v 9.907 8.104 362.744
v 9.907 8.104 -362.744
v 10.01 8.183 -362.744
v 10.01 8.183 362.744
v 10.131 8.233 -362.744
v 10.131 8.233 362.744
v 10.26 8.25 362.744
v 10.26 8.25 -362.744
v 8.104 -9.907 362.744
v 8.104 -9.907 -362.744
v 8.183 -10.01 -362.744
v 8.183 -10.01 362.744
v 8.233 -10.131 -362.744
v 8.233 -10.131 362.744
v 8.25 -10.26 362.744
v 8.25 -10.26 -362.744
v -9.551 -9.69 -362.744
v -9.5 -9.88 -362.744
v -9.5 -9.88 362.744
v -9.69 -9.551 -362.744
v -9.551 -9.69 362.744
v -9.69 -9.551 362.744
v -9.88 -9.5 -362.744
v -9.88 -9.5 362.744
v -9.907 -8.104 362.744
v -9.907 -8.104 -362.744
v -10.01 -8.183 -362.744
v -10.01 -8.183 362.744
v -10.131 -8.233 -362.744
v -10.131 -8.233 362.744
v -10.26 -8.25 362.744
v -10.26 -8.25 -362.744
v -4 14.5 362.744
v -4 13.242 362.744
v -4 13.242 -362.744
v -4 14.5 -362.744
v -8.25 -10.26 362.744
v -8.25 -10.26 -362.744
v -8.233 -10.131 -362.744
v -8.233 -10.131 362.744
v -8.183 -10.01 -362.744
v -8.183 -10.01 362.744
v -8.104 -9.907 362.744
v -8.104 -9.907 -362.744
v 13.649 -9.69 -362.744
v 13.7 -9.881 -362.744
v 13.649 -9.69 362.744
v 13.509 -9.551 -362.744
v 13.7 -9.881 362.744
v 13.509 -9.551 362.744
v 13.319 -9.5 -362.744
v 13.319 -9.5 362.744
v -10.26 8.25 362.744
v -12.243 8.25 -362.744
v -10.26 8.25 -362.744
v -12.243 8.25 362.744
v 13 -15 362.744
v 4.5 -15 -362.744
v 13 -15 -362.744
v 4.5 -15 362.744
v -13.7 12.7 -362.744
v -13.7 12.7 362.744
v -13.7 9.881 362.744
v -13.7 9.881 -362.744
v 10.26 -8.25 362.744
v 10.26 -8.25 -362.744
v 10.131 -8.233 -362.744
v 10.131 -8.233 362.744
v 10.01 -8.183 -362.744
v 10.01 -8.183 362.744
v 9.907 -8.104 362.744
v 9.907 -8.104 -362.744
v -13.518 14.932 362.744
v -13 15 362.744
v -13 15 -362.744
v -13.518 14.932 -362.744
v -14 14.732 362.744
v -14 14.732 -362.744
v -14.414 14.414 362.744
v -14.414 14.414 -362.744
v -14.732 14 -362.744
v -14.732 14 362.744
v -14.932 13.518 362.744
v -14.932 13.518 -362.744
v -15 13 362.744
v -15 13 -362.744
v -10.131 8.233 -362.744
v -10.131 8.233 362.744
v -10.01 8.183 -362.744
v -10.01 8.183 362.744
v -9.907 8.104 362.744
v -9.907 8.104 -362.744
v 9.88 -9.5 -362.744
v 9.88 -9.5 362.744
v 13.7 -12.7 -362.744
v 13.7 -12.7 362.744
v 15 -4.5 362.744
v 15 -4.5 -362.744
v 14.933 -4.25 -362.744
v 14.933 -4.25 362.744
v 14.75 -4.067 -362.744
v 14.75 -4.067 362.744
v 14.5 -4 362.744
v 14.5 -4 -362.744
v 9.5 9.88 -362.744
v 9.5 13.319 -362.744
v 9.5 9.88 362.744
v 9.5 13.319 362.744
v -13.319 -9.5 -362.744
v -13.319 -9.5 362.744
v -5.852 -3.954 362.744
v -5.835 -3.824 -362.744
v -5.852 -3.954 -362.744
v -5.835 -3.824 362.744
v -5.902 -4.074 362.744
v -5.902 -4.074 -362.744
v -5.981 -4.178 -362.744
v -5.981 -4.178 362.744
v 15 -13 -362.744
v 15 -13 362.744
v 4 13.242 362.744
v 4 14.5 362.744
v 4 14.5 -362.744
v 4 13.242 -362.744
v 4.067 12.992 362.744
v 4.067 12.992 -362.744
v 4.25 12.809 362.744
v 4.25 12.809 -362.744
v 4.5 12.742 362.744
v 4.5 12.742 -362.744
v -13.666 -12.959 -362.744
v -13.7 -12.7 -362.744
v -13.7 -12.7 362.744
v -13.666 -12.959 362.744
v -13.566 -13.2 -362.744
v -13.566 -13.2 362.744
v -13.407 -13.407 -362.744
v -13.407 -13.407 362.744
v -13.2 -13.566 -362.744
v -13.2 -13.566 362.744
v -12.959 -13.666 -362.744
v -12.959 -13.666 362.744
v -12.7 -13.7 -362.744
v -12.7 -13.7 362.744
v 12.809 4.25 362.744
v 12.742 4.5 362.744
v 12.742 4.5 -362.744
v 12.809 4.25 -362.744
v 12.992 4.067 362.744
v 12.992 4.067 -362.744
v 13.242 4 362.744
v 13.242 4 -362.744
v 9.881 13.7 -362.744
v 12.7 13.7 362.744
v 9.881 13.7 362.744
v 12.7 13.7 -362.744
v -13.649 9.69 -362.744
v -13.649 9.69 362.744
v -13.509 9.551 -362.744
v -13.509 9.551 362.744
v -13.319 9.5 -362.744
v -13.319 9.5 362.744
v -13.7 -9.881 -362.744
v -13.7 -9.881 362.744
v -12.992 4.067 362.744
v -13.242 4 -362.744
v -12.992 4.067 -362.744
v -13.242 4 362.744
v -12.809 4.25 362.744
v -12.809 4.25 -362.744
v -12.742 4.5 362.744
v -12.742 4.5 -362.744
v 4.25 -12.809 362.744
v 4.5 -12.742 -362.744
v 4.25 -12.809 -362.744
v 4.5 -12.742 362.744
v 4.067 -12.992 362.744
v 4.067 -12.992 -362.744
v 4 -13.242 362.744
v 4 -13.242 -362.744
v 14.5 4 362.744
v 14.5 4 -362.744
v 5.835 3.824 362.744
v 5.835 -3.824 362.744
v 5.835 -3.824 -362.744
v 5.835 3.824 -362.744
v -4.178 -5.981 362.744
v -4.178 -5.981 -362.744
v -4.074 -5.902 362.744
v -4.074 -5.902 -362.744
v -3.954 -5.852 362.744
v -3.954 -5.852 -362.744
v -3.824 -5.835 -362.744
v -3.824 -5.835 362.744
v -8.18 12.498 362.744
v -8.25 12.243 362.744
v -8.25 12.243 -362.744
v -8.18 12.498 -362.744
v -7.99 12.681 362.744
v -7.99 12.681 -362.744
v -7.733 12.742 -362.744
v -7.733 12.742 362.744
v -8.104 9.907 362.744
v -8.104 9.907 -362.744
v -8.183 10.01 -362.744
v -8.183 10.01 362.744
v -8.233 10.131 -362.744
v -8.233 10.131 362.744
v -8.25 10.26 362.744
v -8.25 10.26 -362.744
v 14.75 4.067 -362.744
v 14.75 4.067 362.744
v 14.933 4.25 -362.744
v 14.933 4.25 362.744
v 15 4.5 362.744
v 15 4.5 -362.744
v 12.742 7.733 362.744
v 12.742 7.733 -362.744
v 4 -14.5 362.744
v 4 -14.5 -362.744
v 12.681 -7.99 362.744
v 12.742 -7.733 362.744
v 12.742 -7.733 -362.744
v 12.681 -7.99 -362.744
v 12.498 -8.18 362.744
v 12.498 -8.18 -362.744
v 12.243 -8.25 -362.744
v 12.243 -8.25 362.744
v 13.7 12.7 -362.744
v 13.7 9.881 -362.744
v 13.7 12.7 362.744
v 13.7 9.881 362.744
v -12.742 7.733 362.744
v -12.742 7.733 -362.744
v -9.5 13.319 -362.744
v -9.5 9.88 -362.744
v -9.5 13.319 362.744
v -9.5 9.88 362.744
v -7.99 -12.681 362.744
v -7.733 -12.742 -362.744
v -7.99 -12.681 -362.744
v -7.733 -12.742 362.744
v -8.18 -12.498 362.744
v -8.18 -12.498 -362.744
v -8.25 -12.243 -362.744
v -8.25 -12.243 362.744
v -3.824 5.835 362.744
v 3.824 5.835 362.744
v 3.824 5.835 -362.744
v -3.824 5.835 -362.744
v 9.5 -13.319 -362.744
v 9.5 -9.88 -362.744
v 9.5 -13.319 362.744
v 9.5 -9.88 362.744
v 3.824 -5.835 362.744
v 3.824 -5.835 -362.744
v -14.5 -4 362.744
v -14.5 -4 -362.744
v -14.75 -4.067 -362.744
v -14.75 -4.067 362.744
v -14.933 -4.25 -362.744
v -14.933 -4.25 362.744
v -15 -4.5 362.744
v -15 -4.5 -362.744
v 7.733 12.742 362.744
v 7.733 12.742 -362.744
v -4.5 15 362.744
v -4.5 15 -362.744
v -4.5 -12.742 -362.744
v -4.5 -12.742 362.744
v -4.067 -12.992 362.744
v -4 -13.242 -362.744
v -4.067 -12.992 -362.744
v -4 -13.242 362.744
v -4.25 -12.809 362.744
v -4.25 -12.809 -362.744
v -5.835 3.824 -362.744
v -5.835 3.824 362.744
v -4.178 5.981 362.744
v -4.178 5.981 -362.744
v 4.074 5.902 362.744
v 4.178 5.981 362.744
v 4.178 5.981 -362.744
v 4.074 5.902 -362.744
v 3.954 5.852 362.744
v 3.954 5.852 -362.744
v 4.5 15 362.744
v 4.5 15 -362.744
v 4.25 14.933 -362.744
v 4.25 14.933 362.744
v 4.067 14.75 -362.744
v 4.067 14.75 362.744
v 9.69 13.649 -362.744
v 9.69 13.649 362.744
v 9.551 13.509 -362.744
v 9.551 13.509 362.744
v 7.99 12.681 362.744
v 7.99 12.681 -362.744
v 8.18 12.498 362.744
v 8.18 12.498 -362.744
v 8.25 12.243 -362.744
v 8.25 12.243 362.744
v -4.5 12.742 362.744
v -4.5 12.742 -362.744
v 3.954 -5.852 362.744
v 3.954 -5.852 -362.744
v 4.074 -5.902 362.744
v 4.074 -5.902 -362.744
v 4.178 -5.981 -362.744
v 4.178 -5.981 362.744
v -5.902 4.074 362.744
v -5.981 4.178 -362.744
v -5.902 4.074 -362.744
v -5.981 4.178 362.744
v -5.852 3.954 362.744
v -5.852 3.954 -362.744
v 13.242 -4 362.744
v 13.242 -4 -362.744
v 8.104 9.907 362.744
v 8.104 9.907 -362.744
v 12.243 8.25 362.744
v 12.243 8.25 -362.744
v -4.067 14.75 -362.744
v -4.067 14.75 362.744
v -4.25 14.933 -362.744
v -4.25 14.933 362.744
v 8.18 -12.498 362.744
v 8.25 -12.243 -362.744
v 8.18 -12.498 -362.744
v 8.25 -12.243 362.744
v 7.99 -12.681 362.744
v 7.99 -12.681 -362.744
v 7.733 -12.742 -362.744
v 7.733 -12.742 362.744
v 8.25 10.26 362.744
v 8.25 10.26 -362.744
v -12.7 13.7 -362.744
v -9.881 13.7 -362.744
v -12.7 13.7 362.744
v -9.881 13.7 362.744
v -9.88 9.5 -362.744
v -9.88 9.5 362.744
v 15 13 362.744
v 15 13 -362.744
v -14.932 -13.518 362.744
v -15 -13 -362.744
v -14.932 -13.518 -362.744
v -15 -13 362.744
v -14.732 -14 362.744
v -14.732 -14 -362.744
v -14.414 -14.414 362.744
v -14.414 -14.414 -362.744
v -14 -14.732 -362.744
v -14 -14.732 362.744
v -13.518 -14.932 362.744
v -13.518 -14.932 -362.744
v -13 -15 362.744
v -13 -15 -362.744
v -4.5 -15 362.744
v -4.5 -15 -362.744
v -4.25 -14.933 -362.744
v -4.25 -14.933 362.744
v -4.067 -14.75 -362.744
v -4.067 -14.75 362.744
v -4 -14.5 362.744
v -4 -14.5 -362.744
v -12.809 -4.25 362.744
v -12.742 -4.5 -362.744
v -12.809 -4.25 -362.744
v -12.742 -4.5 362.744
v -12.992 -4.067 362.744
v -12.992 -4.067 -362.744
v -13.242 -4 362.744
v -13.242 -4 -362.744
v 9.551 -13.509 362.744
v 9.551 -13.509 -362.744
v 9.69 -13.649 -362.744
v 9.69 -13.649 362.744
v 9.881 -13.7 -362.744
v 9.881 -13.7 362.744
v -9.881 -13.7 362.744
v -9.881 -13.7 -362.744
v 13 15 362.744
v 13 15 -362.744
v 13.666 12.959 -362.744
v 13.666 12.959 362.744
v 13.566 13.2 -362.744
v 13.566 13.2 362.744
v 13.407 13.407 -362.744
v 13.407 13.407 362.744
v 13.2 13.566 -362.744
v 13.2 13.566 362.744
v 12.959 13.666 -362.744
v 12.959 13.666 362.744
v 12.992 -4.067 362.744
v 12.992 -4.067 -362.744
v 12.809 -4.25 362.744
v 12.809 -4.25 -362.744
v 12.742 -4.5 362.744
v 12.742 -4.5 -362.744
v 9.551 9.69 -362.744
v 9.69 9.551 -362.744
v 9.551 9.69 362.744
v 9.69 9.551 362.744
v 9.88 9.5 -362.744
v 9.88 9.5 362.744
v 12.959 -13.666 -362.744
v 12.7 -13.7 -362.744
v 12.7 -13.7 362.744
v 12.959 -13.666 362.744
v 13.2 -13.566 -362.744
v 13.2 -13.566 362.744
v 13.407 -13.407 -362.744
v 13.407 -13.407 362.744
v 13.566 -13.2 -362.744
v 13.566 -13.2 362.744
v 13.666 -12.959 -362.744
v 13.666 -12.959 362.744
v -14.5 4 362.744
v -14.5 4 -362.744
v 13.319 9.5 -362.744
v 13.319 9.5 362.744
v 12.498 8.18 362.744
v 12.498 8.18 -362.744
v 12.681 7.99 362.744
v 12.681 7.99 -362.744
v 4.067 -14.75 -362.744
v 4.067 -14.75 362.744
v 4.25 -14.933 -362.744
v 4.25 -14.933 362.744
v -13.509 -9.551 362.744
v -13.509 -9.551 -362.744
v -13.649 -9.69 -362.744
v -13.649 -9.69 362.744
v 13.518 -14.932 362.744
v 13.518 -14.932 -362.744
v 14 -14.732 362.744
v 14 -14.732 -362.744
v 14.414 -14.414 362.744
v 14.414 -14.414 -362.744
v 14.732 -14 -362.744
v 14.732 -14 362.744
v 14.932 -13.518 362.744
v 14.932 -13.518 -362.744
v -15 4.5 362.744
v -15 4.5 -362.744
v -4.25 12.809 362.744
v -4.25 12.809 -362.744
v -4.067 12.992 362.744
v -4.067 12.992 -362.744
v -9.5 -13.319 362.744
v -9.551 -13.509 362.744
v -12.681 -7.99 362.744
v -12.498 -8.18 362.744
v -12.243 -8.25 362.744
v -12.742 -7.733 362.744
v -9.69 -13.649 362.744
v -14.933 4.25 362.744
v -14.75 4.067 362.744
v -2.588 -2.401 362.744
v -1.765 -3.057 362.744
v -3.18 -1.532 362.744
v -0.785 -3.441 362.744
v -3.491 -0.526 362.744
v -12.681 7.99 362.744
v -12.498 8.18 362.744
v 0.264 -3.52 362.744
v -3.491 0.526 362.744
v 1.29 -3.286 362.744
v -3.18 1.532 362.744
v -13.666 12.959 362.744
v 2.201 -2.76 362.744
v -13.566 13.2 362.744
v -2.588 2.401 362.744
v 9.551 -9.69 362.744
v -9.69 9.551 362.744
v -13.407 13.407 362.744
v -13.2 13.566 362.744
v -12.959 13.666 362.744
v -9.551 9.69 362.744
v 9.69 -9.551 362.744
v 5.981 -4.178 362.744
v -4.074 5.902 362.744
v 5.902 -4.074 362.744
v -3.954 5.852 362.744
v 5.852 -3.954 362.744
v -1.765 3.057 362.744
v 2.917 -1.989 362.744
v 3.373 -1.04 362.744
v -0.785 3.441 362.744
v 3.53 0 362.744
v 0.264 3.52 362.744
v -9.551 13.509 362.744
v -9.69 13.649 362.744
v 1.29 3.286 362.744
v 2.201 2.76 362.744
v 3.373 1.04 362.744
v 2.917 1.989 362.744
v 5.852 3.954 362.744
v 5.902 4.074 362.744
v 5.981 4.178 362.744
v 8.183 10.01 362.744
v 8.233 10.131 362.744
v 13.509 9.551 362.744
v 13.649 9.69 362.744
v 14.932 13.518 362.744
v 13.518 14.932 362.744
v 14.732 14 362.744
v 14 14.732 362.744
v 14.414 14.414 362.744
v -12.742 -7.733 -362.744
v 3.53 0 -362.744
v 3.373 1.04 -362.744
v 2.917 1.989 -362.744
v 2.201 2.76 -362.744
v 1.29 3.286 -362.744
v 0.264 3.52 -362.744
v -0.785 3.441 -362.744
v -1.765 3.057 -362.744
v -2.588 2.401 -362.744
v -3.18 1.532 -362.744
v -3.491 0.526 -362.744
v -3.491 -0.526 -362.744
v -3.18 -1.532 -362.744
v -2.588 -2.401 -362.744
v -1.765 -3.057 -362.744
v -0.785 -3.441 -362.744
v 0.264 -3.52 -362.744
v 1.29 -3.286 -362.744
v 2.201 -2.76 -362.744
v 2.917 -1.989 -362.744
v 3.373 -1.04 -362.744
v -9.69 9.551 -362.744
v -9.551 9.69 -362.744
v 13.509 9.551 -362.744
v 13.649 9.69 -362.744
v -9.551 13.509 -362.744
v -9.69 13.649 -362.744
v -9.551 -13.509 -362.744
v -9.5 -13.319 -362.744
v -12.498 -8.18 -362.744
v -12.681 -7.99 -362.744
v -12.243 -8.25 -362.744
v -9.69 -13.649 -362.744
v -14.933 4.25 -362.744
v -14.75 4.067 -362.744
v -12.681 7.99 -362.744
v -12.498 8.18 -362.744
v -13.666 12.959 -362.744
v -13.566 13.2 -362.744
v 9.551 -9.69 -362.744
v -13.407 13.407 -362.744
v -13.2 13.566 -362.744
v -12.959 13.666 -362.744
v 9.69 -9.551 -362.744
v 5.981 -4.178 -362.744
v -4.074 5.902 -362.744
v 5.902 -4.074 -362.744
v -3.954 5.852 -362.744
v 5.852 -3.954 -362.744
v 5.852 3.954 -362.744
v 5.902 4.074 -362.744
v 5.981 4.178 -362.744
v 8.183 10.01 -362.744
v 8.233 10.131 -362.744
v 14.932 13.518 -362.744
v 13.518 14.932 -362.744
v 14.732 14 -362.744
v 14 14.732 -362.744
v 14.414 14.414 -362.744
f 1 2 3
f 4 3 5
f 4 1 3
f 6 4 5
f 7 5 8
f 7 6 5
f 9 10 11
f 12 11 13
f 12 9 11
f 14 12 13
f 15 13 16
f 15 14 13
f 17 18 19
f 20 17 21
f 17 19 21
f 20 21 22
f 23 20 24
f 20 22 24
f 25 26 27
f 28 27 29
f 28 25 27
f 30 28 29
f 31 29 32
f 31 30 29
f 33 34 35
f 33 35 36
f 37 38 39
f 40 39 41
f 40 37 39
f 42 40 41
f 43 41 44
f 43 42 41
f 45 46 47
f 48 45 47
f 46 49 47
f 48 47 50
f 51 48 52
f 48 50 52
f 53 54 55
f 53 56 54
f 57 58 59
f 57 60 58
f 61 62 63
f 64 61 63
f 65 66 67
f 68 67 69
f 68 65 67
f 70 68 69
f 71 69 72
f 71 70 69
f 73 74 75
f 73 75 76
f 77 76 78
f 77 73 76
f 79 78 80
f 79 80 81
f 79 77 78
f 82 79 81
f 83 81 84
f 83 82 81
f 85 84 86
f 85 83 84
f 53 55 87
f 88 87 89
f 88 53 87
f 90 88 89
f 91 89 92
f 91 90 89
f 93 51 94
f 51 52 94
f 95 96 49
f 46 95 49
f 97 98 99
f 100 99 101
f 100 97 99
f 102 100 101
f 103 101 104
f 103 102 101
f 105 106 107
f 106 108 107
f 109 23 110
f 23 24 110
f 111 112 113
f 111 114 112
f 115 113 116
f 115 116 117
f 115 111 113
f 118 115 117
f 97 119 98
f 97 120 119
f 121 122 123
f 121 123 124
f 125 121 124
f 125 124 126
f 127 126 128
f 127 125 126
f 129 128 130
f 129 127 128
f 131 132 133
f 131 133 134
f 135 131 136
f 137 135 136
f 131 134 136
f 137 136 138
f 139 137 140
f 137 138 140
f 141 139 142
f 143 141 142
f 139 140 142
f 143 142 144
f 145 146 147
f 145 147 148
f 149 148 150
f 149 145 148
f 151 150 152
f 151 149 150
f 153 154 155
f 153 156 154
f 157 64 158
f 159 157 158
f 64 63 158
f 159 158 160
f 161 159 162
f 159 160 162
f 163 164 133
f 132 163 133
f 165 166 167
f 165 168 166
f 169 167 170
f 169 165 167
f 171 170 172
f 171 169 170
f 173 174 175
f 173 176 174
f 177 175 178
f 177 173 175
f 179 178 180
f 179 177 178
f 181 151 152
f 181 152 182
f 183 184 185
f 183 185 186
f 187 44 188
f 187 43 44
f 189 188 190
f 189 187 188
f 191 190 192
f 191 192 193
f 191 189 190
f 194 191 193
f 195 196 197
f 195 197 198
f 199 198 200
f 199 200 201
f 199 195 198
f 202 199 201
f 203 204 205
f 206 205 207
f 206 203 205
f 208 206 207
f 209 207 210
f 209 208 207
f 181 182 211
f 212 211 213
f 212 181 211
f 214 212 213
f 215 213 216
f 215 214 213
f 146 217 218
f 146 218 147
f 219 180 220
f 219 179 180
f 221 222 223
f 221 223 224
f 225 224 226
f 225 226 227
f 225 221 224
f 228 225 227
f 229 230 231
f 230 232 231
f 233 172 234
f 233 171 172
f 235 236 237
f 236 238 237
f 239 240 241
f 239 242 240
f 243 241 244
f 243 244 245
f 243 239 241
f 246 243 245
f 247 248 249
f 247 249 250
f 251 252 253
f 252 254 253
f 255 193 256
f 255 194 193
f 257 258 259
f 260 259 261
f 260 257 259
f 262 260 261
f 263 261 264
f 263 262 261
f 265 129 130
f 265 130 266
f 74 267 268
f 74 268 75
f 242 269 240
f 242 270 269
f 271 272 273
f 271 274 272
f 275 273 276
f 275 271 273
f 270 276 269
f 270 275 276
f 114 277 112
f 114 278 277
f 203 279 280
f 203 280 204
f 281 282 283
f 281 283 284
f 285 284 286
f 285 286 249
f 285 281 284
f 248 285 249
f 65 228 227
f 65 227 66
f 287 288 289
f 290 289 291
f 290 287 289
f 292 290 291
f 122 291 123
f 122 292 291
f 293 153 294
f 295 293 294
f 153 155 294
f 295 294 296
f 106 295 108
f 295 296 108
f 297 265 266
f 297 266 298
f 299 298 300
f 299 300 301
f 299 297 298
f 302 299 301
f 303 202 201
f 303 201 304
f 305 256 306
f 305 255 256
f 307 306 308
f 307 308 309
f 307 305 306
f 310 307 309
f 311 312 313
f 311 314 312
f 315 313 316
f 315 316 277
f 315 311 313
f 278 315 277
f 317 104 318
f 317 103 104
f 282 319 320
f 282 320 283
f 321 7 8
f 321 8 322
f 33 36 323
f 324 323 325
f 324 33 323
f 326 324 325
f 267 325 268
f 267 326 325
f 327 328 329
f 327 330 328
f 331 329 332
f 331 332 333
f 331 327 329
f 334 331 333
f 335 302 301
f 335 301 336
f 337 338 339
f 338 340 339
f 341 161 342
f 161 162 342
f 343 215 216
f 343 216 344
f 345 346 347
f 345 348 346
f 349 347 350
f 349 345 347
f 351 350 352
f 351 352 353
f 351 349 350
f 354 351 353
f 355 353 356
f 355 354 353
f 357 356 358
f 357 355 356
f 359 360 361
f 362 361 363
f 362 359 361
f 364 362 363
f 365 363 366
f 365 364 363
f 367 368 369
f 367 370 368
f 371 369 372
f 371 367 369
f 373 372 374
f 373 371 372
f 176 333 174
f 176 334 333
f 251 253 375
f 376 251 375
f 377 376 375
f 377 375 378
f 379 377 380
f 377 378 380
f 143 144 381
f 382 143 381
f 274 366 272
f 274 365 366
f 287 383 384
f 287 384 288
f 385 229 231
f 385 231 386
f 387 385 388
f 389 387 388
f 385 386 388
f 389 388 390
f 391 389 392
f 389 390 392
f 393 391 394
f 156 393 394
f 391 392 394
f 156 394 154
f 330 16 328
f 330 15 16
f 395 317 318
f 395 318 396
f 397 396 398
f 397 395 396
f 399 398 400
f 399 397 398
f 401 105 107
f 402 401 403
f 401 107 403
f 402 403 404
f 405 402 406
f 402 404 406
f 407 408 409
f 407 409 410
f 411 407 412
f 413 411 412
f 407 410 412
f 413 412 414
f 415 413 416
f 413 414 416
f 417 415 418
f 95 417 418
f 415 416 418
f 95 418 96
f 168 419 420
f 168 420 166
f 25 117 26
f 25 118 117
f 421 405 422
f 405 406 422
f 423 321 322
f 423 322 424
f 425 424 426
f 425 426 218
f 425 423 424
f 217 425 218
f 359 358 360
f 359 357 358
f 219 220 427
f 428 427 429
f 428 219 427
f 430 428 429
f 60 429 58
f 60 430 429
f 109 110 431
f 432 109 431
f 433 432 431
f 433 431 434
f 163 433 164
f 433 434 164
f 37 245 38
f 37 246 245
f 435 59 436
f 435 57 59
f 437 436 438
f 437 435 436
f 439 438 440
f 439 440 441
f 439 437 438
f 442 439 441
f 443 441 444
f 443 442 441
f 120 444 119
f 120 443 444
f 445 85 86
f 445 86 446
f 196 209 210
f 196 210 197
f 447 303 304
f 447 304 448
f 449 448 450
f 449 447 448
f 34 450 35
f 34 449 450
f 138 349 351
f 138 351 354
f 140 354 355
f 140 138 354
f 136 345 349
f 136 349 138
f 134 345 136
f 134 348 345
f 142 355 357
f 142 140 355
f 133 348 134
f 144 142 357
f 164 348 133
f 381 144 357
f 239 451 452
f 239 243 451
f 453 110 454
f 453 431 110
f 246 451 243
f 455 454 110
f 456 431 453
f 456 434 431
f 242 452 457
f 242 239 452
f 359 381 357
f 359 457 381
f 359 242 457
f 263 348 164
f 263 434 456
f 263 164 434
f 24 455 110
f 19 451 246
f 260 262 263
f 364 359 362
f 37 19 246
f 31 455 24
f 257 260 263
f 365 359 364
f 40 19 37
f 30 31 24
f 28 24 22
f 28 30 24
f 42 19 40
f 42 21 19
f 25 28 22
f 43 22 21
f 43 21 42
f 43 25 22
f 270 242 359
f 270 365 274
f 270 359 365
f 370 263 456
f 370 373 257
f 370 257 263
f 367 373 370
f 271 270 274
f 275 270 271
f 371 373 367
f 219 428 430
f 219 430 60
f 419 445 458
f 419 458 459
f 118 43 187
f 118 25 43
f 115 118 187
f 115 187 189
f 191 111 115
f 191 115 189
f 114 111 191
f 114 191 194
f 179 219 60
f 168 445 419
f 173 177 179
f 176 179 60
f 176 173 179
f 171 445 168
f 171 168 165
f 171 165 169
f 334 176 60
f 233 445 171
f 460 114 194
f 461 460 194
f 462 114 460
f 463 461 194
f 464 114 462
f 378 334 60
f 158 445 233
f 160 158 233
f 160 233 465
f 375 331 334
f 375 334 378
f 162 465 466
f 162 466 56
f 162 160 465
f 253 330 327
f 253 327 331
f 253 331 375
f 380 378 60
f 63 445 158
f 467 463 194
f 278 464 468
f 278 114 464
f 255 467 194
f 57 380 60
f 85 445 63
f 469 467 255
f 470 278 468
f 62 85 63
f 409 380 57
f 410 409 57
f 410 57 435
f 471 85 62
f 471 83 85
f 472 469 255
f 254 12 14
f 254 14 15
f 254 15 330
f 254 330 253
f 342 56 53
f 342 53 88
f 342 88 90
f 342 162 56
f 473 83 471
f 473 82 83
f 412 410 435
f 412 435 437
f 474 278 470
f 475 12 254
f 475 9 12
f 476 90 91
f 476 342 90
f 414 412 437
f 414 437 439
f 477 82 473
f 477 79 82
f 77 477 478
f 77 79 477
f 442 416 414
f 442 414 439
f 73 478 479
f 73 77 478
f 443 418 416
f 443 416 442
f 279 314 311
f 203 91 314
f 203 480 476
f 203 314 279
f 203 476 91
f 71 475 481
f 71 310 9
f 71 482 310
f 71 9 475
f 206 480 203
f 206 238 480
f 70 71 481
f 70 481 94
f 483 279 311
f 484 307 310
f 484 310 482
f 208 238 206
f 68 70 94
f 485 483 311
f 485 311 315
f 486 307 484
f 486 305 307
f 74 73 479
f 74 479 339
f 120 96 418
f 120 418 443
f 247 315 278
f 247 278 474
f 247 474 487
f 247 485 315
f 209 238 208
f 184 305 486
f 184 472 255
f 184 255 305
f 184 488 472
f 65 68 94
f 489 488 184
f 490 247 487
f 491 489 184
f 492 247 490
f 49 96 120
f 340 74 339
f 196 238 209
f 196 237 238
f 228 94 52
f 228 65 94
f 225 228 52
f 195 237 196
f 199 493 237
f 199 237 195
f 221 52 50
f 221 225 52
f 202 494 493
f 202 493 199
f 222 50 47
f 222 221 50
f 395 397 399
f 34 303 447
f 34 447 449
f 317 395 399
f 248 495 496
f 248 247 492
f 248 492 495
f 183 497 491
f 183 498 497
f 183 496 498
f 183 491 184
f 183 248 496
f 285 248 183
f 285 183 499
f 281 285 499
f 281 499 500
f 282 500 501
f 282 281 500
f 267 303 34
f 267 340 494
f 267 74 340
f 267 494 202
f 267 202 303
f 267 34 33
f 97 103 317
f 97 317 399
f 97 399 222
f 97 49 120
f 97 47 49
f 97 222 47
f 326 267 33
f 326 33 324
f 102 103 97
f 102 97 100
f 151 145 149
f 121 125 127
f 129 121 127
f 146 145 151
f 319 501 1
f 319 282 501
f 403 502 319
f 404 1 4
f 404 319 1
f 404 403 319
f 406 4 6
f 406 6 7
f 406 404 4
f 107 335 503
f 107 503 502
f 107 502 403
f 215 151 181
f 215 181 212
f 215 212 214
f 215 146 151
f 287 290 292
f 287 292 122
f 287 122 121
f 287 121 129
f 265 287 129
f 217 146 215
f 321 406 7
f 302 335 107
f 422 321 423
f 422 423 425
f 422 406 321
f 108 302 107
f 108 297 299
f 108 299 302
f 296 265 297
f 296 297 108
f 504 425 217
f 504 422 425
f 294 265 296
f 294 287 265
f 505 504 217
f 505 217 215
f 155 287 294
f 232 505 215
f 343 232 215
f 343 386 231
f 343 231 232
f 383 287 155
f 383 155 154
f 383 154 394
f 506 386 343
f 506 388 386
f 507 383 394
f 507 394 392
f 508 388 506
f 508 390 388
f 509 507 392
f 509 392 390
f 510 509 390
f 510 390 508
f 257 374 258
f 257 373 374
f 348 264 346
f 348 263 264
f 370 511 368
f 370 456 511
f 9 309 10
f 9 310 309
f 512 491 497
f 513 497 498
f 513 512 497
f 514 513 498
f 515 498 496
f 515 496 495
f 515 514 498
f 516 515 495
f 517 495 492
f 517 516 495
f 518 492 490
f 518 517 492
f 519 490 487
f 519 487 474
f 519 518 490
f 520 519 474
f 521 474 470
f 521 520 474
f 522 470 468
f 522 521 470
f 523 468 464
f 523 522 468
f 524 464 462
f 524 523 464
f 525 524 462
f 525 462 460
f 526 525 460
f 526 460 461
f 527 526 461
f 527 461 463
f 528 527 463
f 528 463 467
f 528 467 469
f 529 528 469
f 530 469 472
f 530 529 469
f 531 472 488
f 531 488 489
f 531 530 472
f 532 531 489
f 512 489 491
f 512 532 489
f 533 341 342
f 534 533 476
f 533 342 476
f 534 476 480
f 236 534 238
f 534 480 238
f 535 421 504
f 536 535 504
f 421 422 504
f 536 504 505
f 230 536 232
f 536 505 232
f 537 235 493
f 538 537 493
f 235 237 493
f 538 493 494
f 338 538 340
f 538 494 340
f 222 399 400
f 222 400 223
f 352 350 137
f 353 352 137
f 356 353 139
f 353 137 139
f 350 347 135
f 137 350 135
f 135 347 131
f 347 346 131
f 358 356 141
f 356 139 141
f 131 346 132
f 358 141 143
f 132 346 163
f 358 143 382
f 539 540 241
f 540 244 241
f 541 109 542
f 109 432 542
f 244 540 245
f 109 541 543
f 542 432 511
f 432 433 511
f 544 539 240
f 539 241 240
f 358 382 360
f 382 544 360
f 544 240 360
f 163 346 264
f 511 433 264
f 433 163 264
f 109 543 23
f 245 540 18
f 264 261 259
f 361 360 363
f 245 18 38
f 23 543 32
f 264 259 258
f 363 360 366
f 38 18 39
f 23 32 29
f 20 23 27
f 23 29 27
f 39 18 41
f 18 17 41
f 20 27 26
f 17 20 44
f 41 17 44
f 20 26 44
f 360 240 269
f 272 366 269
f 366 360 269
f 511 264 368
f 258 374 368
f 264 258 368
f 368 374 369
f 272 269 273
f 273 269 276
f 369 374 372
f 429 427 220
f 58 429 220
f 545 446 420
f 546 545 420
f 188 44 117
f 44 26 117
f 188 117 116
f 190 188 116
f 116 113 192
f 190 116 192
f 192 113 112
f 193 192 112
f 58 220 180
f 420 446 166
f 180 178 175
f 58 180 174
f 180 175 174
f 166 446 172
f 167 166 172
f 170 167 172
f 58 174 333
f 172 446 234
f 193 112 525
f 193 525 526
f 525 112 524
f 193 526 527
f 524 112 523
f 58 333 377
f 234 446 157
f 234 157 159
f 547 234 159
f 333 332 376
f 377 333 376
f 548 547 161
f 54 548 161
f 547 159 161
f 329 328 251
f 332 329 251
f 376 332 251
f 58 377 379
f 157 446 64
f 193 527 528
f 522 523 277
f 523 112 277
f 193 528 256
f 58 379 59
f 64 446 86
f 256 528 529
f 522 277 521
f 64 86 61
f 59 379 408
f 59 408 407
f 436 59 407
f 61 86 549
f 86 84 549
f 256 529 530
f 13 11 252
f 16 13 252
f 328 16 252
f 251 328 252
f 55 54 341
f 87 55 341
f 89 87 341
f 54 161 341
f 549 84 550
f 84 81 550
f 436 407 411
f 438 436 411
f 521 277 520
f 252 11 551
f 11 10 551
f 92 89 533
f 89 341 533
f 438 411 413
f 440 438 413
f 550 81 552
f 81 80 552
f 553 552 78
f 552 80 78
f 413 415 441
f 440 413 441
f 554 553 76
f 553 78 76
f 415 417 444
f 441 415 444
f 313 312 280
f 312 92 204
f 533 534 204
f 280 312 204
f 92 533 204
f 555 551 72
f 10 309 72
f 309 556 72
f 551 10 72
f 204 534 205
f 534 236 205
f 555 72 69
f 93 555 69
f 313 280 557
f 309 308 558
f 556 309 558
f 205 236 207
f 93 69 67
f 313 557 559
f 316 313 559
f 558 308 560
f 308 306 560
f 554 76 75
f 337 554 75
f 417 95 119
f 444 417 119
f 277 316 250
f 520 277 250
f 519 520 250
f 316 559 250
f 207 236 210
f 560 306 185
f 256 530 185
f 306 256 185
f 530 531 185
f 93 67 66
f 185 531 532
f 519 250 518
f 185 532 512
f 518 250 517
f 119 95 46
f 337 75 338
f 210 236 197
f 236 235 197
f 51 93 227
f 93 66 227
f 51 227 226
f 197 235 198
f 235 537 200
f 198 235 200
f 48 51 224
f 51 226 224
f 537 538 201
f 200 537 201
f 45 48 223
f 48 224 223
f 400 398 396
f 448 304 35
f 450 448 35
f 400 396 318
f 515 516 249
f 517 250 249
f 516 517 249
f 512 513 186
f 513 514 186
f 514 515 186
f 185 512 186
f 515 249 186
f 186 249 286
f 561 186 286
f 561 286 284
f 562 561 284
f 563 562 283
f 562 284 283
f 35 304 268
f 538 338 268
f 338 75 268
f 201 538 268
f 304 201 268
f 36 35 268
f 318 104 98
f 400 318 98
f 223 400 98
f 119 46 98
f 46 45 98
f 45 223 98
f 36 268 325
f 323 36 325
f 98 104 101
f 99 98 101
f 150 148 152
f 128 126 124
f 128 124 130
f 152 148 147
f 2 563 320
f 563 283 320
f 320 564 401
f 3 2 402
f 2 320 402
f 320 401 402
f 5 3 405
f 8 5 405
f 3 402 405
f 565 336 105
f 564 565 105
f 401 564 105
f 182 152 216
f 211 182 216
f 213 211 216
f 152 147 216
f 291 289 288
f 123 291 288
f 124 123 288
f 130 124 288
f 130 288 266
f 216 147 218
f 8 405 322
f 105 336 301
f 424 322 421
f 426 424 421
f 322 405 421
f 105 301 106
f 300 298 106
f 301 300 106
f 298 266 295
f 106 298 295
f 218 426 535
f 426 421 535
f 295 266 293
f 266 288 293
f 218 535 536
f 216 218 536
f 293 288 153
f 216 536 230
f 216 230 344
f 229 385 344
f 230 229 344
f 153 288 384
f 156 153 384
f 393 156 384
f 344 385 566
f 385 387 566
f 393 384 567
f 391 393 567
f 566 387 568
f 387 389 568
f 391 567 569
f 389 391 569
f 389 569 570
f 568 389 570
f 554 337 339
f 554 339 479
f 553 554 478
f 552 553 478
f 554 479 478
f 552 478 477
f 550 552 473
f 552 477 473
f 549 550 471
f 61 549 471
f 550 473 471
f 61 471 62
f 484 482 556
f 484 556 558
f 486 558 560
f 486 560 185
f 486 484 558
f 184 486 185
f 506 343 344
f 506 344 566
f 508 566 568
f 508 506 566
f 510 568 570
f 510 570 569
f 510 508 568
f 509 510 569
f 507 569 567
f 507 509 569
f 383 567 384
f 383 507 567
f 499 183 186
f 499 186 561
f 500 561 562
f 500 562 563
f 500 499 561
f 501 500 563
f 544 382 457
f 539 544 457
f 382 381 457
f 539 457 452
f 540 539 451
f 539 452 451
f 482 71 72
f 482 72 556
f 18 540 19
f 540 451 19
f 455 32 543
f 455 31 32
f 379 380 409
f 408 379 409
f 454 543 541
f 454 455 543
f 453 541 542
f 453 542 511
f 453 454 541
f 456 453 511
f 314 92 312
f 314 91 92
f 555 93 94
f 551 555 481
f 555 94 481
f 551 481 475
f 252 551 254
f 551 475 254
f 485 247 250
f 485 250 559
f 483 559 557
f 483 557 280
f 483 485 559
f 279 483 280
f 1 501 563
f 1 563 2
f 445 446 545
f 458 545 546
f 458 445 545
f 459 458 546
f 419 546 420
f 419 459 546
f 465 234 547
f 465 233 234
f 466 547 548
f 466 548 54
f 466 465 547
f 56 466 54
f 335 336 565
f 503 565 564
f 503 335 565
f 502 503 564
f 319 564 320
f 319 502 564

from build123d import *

# Parameters (mm, degrees)
SKETCH1_R           = 3.52998588
BOSS_EXTRUDE1_DEPTH = 362.74375


with BuildPart() as part:
    # Sketch1 → Boss-Extrude1 (new, symmetric)
    with BuildSketch(Plane.XY):
        with BuildLine():
            Line((14.49994, -4), (13.24247465, -4))
            ThreePointArc((13.24247465, -4), (12.88892126, -4.146446609), (12.74247465, -4.5))
            Line((12.74247465, -4.5), (12.74247465, -7.732519321))
            ThreePointArc((12.74247465, -7.732519321), (12.602449697, -8.097296796), (12.242781236, -8.249967))
            Line((12.242781236, -8.249967), (10.260188032, -8.249967))
            ThreePointArc((10.260188032, -8.249967), (10.068847082, -8.211906919), (9.906636056, -8.103520976))
            Line((9.906636056, -8.103520976), (5.981117769, -4.178002689))
            ThreePointArc((5.981117769, -4.178002689), (5.872731827, -4.015791664), (5.834671745, -3.824450713))
            Line((5.834671745, -3.824450713), (5.834671745, -1.01249595))
            Line((5.834671745, -1.01249595), (5.834671745, 0.88749645))
            Line((5.834671745, 0.88749645), (5.834671745, 3.824450713))
            ThreePointArc((5.834671745, 3.824450713), (5.872731827, 4.015791664), (5.981117769, 4.178002689))
            Line((5.981117769, 4.178002689), (9.906636056, 8.103520976))
            ThreePointArc((9.906636056, 8.103520976), (10.068847082, 8.211906919), (10.260188032, 8.249967))
            Line((10.260188032, 8.249967), (12.242781236, 8.249967))
            ThreePointArc((12.242781236, 8.249967), (12.602449697, 8.097296796), (12.74247465, 7.732519321))
            Line((12.74247465, 7.732519321), (12.74247465, 4.5))
            ThreePointArc((12.74247465, 4.5), (12.88892126, 4.146446609), (13.24247465, 4))
            Line((13.24247465, 4), (14.49994, 4))
            ThreePointArc((14.49994, 4), (14.853493391, 4.146446609), (14.99994, 4.5))
            Line((14.99994, 4.5), (14.99994, 12.999948))
            ThreePointArc((14.99994, 12.999948), (14.414155906, 14.414155906), (12.999948, 14.99994))
            Line((12.999948, 14.99994), (4.5, 14.99994))
            ThreePointArc((4.5, 14.99994), (4.146446609, 14.853493391), (4, 14.49994))
            Line((4, 14.49994), (4, 13.24247465))
            ThreePointArc((4, 13.24247465), (4.146446609, 12.88892126), (4.5, 12.74247465))
            Line((4.5, 12.74247465), (7.732519321, 12.74247465))
            ThreePointArc((7.732519321, 12.74247465), (8.097296796, 12.602449697), (8.249967, 12.242781236))
            Line((8.249967, 12.242781236), (8.249967, 10.260188032))
            ThreePointArc((8.249967, 10.260188032), (8.211906919, 10.068847082), (8.103520976, 9.906636056))
            Line((8.103520976, 9.906636056), (4.178002689, 5.981117769))
            ThreePointArc((4.178002689, 5.981117769), (4.015791664, 5.872731827), (3.824450713, 5.834671745))
            Line((3.824450713, 5.834671745), (0.9499962, 5.834671745))
            Line((0.9499962, 5.834671745), (-0.9499962, 5.834671745))
            Line((-0.9499962, 5.834671745), (-3.824450713, 5.834671745))
            ThreePointArc((-3.824450713, 5.834671745), (-4.015791664, 5.872731827), (-4.178002689, 5.981117769))
            Line((-4.178002689, 5.981117769), (-8.103520976, 9.906636056))
            ThreePointArc((-8.103520976, 9.906636056), (-8.211906919, 10.068847082), (-8.249967, 10.260188032))
            Line((-8.249967, 10.260188032), (-8.249967, 12.242781236))
            ThreePointArc((-8.249967, 12.242781236), (-8.097296796, 12.602449697), (-7.732519321, 12.74247465))
            Line((-7.732519321, 12.74247465), (-4.5, 12.74247465))
            ThreePointArc((-4.5, 12.74247465), (-4.146446609, 12.88892126), (-4, 13.24247465))
            Line((-4, 13.24247465), (-4, 14.49994))
            ThreePointArc((-4, 14.49994), (-4.146446609, 14.853493391), (-4.5, 14.99994))
            Line((-4.5, 14.99994), (-12.999948, 14.99994))
            ThreePointArc((-12.999948, 14.99994), (-14.414155906, 14.414155906), (-14.99994, 12.999948))
            Line((-14.99994, 12.999948), (-14.99994, 4.5))
            ThreePointArc((-14.99994, 4.5), (-14.853493391, 4.146446609), (-14.49994, 4))
            Line((-14.49994, 4), (-13.24247465, 4))
            ThreePointArc((-13.24247465, 4), (-12.88892126, 4.146446609), (-12.74247465, 4.5))
            Line((-12.74247465, 4.5), (-12.74247465, 7.732519321))
            ThreePointArc((-12.74247465, 7.732519321), (-12.602449697, 8.097296796), (-12.242781236, 8.249967))
            Line((-12.242781236, 8.249967), (-10.260188032, 8.249967))
            ThreePointArc((-10.260188032, 8.249967), (-10.068847082, 8.211906919), (-9.906636056, 8.103520976))
            Line((-9.906636056, 8.103520976), (-5.981117769, 4.178002689))
            ThreePointArc((-5.981117769, 4.178002689), (-5.872731827, 4.015791664), (-5.834671745, 3.824450713))
            Line((-5.834671745, 3.824450713), (-5.834671745, 0.88749645))
            Line((-5.834671745, 0.88749645), (-5.834671745, -1.01249595))
            Line((-5.834671745, -1.01249595), (-5.834671745, -3.824450713))
            ThreePointArc((-5.834671745, -3.824450713), (-5.872731827, -4.015791664), (-5.981117769, -4.178002689))
            Line((-5.981117769, -4.178002689), (-9.906636056, -8.103520976))
            ThreePointArc((-9.906636056, -8.103520976), (-10.068847082, -8.211906919), (-10.260188032, -8.249967))
            Line((-10.260188032, -8.249967), (-12.242781236, -8.249967))
            ThreePointArc((-12.242781236, -8.249967), (-12.602449697, -8.097296796), (-12.74247465, -7.732519321))
            Line((-12.74247465, -7.732519321), (-12.74247465, -4.5))
            ThreePointArc((-12.74247465, -4.5), (-12.88892126, -4.146446609), (-13.24247465, -4))
            Line((-13.24247465, -4), (-14.49994, -4))
            ThreePointArc((-14.49994, -4), (-14.853493391, -4.146446609), (-14.99994, -4.5))
            Line((-14.99994, -4.5), (-14.99994, -12.999948))
            ThreePointArc((-14.99994, -12.999948), (-14.414155906, -14.414155906), (-12.999948, -14.99994))
            Line((-12.999948, -14.99994), (-4.5, -14.99994))
            ThreePointArc((-4.5, -14.99994), (-4.146446609, -14.853493391), (-4, -14.49994))
            Line((-4, -14.49994), (-4, -13.24247465))
            ThreePointArc((-4, -13.24247465), (-4.146446609, -12.88892126), (-4.5, -12.74247465))
            Line((-4.5, -12.74247465), (-7.732519321, -12.74247465))
            ThreePointArc((-7.732519321, -12.74247465), (-8.097296796, -12.602449697), (-8.249967, -12.242781236))
            Line((-8.249967, -12.242781236), (-8.249967, -10.260188032))
            ThreePointArc((-8.249967, -10.260188032), (-8.211906919, -10.068847082), (-8.103520976, -9.906636056))
            Line((-8.103520976, -9.906636056), (-4.178002689, -5.981117769))
            ThreePointArc((-4.178002689, -5.981117769), (-4.015791664, -5.872731827), (-3.824450713, -5.834671745))
            Line((-3.824450713, -5.834671745), (-0.9499962, -5.834671745))
            Line((-0.9499962, -5.834671745), (0.9499962, -5.834671745))
            Line((0.9499962, -5.834671745), (3.824450713, -5.834671745))
            ThreePointArc((3.824450713, -5.834671745), (4.015791664, -5.872731827), (4.178002689, -5.981117769))
            Line((4.178002689, -5.981117769), (8.103520976, -9.906636056))
            ThreePointArc((8.103520976, -9.906636056), (8.211906919, -10.068847082), (8.249967, -10.260188032))
            Line((8.249967, -10.260188032), (8.249967, -12.242781236))
            ThreePointArc((8.249967, -12.242781236), (8.097296796, -12.602449697), (7.732519321, -12.74247465))
            Line((7.732519321, -12.74247465), (4.5, -12.74247465))
            ThreePointArc((4.5, -12.74247465), (4.146446609, -12.88892126), (4, -13.24247465))
            Line((4, -13.24247465), (4, -14.49994))
            ThreePointArc((4, -14.49994), (4.146446609, -14.853493391), (4.5, -14.99994))
            Line((4.5, -14.99994), (12.999948, -14.99994))
            ThreePointArc((12.999948, -14.99994), (14.414155906, -14.414155906), (14.99994, -12.999948))
            Line((14.99994, -12.999948), (14.99994, -4.5))
            ThreePointArc((14.99994, -4.5), (14.853493391, -4.146446609), (14.49994, -4))
        make_face()
        Circle(SKETCH1_R, mode=Mode.SUBTRACT)
        with BuildLine():
            Line((-12.6999492, -13.6999452), (-9.880960476, -13.6999452))
            ThreePointArc((-9.880960476, -13.6999452), (-9.61155387, -13.58835333), (-9.499962, -13.318946724))
            Line((-9.499962, -13.318946724), (-9.499962, -9.87996048))
            ThreePointArc((-9.499962, -9.87996048), (-9.611260978, -9.611260978), (-9.87996048, -9.499962))
            Line((-9.87996048, -9.499962), (-13.318946724, -9.499962))
            ThreePointArc((-13.318946724, -9.499962), (-13.58835333, -9.61155387), (-13.6999452, -9.880960476))
            Line((-13.6999452, -9.880960476), (-13.6999452, -12.6999492))
            ThreePointArc((-13.6999452, -12.6999492), (-13.407053153, -13.407053153), (-12.6999492, -13.6999452))
        make_face(mode=Mode.SUBTRACT)
        with BuildLine():
            Line((13.6999452, -12.6999492), (13.6999452, -9.880960476))
            ThreePointArc((13.6999452, -9.880960476), (13.58835333, -9.61155387), (13.318946724, -9.499962))
            Line((13.318946724, -9.499962), (9.87996048, -9.499962))
            ThreePointArc((9.87996048, -9.499962), (9.611260978, -9.611260978), (9.499962, -9.87996048))
            Line((9.499962, -9.87996048), (9.499962, -13.318946724))
            ThreePointArc((9.499962, -13.318946724), (9.61155387, -13.58835333), (9.880960476, -13.6999452))
            Line((9.880960476, -13.6999452), (12.6999492, -13.6999452))
            ThreePointArc((12.6999492, -13.6999452), (13.407053153, -13.407053153), (13.6999452, -12.6999492))
        make_face(mode=Mode.SUBTRACT)
        with BuildLine():
            Line((9.87996048, 9.499962), (13.318946724, 9.499962))
            ThreePointArc((13.318946724, 9.499962), (13.58835333, 9.61155387), (13.6999452, 9.880960476))
            Line((13.6999452, 9.880960476), (13.6999452, 12.6999492))
            ThreePointArc((13.6999452, 12.6999492), (13.407053153, 13.407053153), (12.6999492, 13.6999452))
            Line((12.6999492, 13.6999452), (9.880960476, 13.6999452))
            ThreePointArc((9.880960476, 13.6999452), (9.61155387, 13.58835333), (9.499962, 13.318946724))
            Line((9.499962, 13.318946724), (9.499962, 9.87996048))
            ThreePointArc((9.499962, 9.87996048), (9.611260978, 9.611260978), (9.87996048, 9.499962))
        make_face(mode=Mode.SUBTRACT)
        with BuildLine():
            Line((-13.6999452, 12.6999492), (-13.6999452, 9.880960476))
            ThreePointArc((-13.6999452, 9.880960476), (-13.58835333, 9.61155387), (-13.318946724, 9.499962))
            Line((-13.318946724, 9.499962), (-9.87996048, 9.499962))
            ThreePointArc((-9.87996048, 9.499962), (-9.611260978, 9.611260978), (-9.499962, 9.87996048))
            Line((-9.499962, 9.87996048), (-9.499962, 13.318946724))
            ThreePointArc((-9.499962, 13.318946724), (-9.61155387, 13.58835333), (-9.880960476, 13.6999452))
            Line((-9.880960476, 13.6999452), (-12.6999492, 13.6999452))
            ThreePointArc((-12.6999492, 13.6999452), (-13.407053153, 13.407053153), (-13.6999452, 12.6999492))
        make_face(mode=Mode.SUBTRACT)
    extrude(amount=BOSS_EXTRUDE1_DEPTH, both=True)


solid = part.part
